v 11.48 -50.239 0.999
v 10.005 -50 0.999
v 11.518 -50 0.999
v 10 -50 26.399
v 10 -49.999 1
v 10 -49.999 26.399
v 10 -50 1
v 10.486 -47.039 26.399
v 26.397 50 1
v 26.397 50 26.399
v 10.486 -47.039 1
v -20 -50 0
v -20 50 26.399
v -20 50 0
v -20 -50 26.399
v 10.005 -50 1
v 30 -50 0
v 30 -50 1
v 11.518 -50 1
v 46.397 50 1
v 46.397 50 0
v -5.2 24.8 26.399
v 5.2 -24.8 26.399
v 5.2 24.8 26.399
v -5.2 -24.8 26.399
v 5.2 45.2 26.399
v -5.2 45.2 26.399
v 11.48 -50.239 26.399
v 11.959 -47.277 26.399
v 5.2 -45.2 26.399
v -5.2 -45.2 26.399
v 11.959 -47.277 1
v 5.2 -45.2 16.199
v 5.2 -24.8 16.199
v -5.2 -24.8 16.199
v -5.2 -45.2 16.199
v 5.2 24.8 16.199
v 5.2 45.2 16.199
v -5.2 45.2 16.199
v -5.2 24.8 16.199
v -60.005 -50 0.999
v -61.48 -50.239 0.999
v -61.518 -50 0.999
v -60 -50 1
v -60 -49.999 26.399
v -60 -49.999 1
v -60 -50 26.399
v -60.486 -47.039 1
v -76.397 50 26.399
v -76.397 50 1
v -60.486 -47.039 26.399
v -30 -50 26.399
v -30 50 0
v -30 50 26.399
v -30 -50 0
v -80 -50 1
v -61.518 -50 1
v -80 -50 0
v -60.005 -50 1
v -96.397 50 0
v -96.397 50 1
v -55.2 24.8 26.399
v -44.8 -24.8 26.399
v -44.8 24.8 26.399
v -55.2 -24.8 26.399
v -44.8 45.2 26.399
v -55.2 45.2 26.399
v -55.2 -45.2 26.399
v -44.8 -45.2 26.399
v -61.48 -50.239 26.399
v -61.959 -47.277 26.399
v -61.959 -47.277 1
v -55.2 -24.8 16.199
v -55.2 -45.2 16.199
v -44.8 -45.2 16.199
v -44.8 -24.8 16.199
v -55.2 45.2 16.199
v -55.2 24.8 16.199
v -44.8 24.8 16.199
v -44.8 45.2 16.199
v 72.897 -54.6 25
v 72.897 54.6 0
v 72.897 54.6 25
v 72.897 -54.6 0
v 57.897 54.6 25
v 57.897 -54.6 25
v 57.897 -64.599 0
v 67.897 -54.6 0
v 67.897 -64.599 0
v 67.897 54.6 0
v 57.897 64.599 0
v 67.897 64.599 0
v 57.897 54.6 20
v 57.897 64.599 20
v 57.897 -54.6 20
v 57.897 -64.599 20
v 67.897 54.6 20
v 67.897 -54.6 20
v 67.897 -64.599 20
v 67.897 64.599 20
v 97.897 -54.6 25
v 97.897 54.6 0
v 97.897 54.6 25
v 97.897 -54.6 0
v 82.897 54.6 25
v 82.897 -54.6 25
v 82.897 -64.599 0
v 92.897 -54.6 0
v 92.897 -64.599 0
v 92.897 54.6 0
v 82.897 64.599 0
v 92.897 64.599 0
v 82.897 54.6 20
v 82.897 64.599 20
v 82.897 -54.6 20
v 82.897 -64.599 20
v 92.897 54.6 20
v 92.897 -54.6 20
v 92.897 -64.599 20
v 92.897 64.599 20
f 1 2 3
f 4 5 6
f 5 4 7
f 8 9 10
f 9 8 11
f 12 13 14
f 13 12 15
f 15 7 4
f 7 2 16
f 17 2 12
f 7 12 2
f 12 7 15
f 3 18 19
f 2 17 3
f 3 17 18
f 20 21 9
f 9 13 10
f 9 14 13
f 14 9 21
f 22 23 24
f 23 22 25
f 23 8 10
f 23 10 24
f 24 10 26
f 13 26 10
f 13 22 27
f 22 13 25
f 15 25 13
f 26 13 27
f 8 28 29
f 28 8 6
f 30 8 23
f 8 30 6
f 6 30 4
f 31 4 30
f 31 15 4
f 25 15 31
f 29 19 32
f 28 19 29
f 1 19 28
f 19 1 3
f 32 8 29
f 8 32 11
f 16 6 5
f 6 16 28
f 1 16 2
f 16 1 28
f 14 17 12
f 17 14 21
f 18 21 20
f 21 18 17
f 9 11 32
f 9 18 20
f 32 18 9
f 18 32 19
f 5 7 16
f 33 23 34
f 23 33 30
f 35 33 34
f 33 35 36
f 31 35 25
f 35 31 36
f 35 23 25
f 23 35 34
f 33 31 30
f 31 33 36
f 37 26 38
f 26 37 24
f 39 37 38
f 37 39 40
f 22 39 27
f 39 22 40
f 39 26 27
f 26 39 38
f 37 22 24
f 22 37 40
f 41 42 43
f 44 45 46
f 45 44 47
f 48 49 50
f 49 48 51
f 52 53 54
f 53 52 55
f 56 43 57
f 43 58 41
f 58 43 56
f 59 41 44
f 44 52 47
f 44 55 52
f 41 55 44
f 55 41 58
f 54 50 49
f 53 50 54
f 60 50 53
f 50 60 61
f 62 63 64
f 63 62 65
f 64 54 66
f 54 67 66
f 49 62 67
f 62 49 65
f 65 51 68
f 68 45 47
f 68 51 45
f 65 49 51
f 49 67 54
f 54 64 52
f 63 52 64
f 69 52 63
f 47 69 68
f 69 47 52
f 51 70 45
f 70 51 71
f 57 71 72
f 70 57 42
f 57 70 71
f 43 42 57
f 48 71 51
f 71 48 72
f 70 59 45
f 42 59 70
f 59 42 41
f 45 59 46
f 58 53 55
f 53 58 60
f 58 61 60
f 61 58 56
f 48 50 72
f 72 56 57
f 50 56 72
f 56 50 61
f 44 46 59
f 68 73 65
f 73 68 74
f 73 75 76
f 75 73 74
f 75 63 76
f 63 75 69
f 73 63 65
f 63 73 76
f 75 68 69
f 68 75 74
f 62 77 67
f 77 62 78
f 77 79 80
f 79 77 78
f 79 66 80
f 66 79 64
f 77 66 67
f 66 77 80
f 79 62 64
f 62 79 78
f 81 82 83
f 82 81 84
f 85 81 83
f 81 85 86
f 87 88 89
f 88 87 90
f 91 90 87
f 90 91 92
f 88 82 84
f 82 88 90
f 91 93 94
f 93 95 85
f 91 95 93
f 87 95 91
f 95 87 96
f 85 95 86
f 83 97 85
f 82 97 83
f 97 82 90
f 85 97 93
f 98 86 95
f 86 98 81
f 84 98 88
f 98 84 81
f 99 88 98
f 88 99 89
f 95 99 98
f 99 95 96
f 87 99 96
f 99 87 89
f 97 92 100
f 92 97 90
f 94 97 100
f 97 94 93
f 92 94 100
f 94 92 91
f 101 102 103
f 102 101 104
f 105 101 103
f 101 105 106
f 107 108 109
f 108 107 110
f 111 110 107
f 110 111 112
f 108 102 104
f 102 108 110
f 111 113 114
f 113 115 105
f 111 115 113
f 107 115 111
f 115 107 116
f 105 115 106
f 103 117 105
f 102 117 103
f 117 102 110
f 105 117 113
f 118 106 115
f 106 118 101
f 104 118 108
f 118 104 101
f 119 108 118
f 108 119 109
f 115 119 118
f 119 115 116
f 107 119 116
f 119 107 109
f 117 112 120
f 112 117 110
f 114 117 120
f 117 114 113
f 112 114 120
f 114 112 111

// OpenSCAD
// ---------------------------------------------------------------------------
// Customizable stand for music gear
// v1.2.1
// ---------------------------------------------------------------------------
// Copyright (c) Yohan Lasorsa
// For personal use only, do not redistribute (please).
// ---------------------------------------------------------------------------
// LICENSE AGREEMENT:
// This software is provided 'as-is', without any express or implied warranty.
// In no event will the authors be held liable for any damages arising from
// the use of this software.
//
// 1. You can use and adapt this code, generate 3d models models from it and
//    print them, only for your own personal usage.
// 2. You're not allowed to redistribute this code or the 3d models generated
//    from it in any form.
// 3. You're not allowed to make any commercial usage or profit based on this
//    code or any form of its derivatives, including but not limited to,
//    3d models and printed models.
// ---------------------------------------------------------------------------
// Suggested print settings, tested with a Creality Ender 3 and Cura 5 with
// Eryone PLA filament:
// - 0.28mm layer height
// - 80mm/s print speed (40mm/s for walls)
// - Minimum 10% infill, cubic shape
//   * Recommended >= 20%, use gradual infill steps = 1 to reduce the amount
//     of used material
// - No supports needed
//
// For a different finish touch, you can try removing the top/bottom layers
// and use a geometric pattern like grid or triangles with a constant infill
// density of minimum 10%.
// ---------------------------------------------------------------------------
// Default paramameters fit a Digitakt/Digitone/Syntakt.
// See custom_stand.json file for other parameters sets.
// ---------------------------------------------------------------------------

/* [Device dimensions] ------------------------------------ */

// Device width in mm
device_width = 160;

// Device depth in mm
device_depth = 100;

// Device front height in mm
device_front_height = 20;

// Device back height in mm
device_back_height = 40;

/* [Target position] -------------------------------------- */

// Target device front height in mm
target_front_height = 50;

// Target device back height in mm (automatically calculated target_angle is used)
target_back_height = 100;

// Target device angle in degrees. If different from 0, target_back_height is automatically calculated to match the angle.
target_angle = 20;

/* [Support] ---------------------------------------------- */

// Side support width in mm. Make sure the width is large enough so that device's feet can rest on it.
support_width = 25;

// Adds a spacer between the two side supports to connect them
support_spacer = true;

// Spacer height in mm
support_spacer_height = 15;

// Spacer depth in mm
support_spacer_depth = 25;

// Front spacer height offset in mm. Adds space below the spacer, allowing for passing cables for example.
support_spacer_front_height_offset = 10;

// Back spacer height offset in mm. Adds space below the spacer, allowing for passing cables for example.
support_spacer_back_height_offset = 10;

// Offset the front spacer towards the inside of the support
support_spacer_front_depth_offset = 0;

// Offset the back spacer towards the inside of the support
support_spacer_back_depth_offset = 0;

/* [Front blocker] ---------------------------------------- */

// Adds a blocker in front of the device to prevent it from sliding forward
front_blocker = true;

// Front blocker height in mm. Should match the height of the device's feet.
front_blocker_height = 1.5;

// Front blocker depth in mm. Should match the front offset of the device's feet.
front_blocker_depth = 3;

/* [Connector] -------------------------------------------- */

// Depth of the connector part that will fit inside the side supports. Must be smaller than support_spacer_depth.
connector_depth = 20;

// Height of the connector part that will fit inside the side supports. Must be smaller than support_spacer_height.
connector_height = 10;

// Width of the connector part that will fit inside the side supports. Must be smaller than support_width.
connector_width = 10;

// Connector fit tolerance in mm. Increase this value if the connector doesn't fit inside the support or decrease to make it fit tighter.
connector_fit_tolerance = 0.4;

/* [Ears] ------------------------------------------------- */

// Adds ears to the side supports to prevent the device from moving sideways
support_ears = true;

// Ear height in mm. If support_ears_follow_device_angle is enabled, this is the minimum height of the ear.
support_ears_height = 20;

// Ear width in mm
support_ears_width = 1;

// Extra space between the device and the support ears in mm
support_ears_slack = 0.4;

// If true, the support ears follow the device angle, otherwise they follow the support angle.
support_ears_follow_device_angle = false;

/* [Other] ------------------------------------------------ */

// Show only the left support
only_left_support = false;

// Show only the right support
only_right_support = false;

// Show only a single spacer
only_support_single_spacer = false;

// Top flat view of the parts
flat_view = false;

// Show the final preview with all the parts connected. DO NOT PRINT THIS!
final_preview = false;

// Space between parts in mm
separation_offset = 10;

/* [Hidden] */

min_connector_margin = 2;
final_connector_width = min(connector_width, support_width - min_connector_margin);
final_connector_depth = min(connector_depth, support_spacer_depth - min_connector_margin);
final_connector_height = min(connector_height, support_spacer_height - min_connector_margin);

final_target_back_height = target_angle == 0 ?
  target_back_height :
  target_front_height + tan(target_angle) * device_depth;
final_target_angle = target_angle == 0 ?
  atan((target_back_height - target_front_height) / device_depth) :
  target_angle;

echo("Calculated target ", target_angle == 0 ?
  str("angle: ", final_target_angle) :
  str("back height: ", final_target_back_height)
);

fudge = .001;
final_support_width = support_width +
  (support_ears ? support_ears_slack : 0);
total_support_width = final_support_width +
  (support_ears ? support_ears_width - fudge : 0);

device_height_difference = device_back_height - device_front_height;
ear_front_height_offset = support_ears_follow_device_angle ?
  (device_height_difference < 0 ? -device_height_difference : 0) : 0;
ear_back_height_offset = support_ears_follow_device_angle ?
  (device_height_difference > 0 ? device_height_difference : 0) : 0;
ear_front_height = support_ears_height + ear_front_height_offset;
ear_back_height = support_ears_height + ear_back_height_offset;
support_front_height = target_front_height - device_front_height;
support_back_height = final_target_back_height - device_back_height;
support_spacer_width = device_width - final_support_width * 2;
support_x_size = max(support_front_height, support_back_height) +
  (front_blocker ? front_blocker_height : 0) +
  (support_ears ? max(ear_front_height, ear_back_height) : 0);
support_spacer_y_size = support_spacer_width + final_connector_width*2;

$fa = 10;
$fs = .4;
$vpr = [
  flat_view ? 0 : (final_preview ? 67.5 : 22.5),
  0,
  flat_view ? 0 : (final_preview ? 22.5 : 0)
];
$vpd = 700;
$vpt = [0, 0, 0];

// --------------------------------------------------------

module support () {
  points = [
    [0, 0],
    [0, device_depth],
    [support_back_height, device_depth],
    [support_front_height, 0],
  ];
  path = [
    [0, 1, 2, 3]
  ];
  ears_width_offset = support_ears ?
    support_ears_width - fudge : 0;

  translate([-support_x_size/2, -device_depth/2, ears_width_offset]) {
    difference() {
      union() {
        union() {
          linear_extrude(final_support_width) { 
            polygon(points, path);
          }
          if (front_blocker) {
            blocker();
          }
        }
        if (support_ears) {
          translate([0, 0, -ears_width_offset]) {
            ear();
          }
        }
      }
      if (support_spacer) {
        connector_holes();
      }
    }
  }
}

module ear() {
  points = [
    [0, 0],
    [0, device_depth],
    [support_back_height + support_ears_height + ear_back_height_offset, device_depth],
    [support_front_height + support_ears_height + ear_front_height_offset, 0],
  ];
  path = [
    [0, 1, 2, 3]
  ];
  color("orange")
  linear_extrude(support_ears_width) { 
    polygon(points, path);
  }
}

module blocker() {
  opposite_side = support_back_height - support_front_height;
  hypotenuse = sqrt(pow(opposite_side, 2) +  pow(device_depth, 2));
  blocker_angle = atan(opposite_side / hypotenuse);

  translate([support_front_height - fudge, fudge, 0]) {
    rotate([0, 0, -blocker_angle]) {
      color("red")
      cube([front_blocker_height, front_blocker_depth, final_support_width]);
    }
  }
}

module connector_holes() {
  connector_height_offset = support_spacer_height - final_connector_height;
  connector_width_offset = final_support_width - final_connector_width;
  connector_depth_offset_front = support_spacer_depth - final_connector_depth;
  connector_depth_offset_back = device_depth - support_spacer_depth;

  // Front spacer hole
  translate([
    connector_height_offset - connector_fit_tolerance/2 + support_spacer_front_height_offset,
    connector_depth_offset_front + support_spacer_front_depth_offset - connector_fit_tolerance/2,
    connector_width_offset - connector_fit_tolerance/2
  ]) {
    color("lightblue")
    cube([
      final_connector_height + connector_fit_tolerance,
      final_connector_depth + connector_fit_tolerance,
      final_connector_width + connector_fit_tolerance
    ]);
  }
  // Back spacer hole
  translate([
    connector_height_offset - connector_fit_tolerance/2 + support_spacer_back_height_offset,
    connector_depth_offset_back - support_spacer_back_depth_offset - connector_fit_tolerance/2,
    connector_width_offset - connector_fit_tolerance/2
  ]) {
    color("lightblue")
    cube([
      final_connector_height + connector_fit_tolerance,
      final_connector_depth + connector_fit_tolerance,
      final_connector_width + connector_fit_tolerance
    ]);
  }
}

module spacer() {
  translate([0, -support_spacer_y_size/2, 0]) {
    translate([-support_spacer_height/2, final_connector_width, 0]) {
      union() {
        cube([support_spacer_height, support_spacer_width, support_spacer_depth]);
        translate([0, -final_connector_width + fudge, 0]) {
          color("lightblue")
          cube([final_connector_height, final_connector_width, final_connector_depth]);
        }
        translate([0, support_spacer_width - fudge, 0]) {
          color("lightblue")
          cube([final_connector_height, final_connector_width, final_connector_depth]);
        } 
      }
    }
  }
}

if (only_right_support) {
  support();
} else if (only_left_support) {
  scale([-1, 1, 1]) {
    support();
  }
} else if (only_support_single_spacer) {
  spacer();
} else if (final_preview) {
  translate([0, 0, -support_x_size/2]) {
    // Right support
    translate([total_support_width + support_spacer_width/2, 0, support_x_size/2]) {
      rotate([0, -90, 0]) {
        support();
      }
    }

    // Left support
    translate([-total_support_width - support_spacer_width/2, 0, support_x_size/2]) {
      rotate([0, 90, 0]) {
        scale([-1, 1, 1]) {
          support();
        }
      }
    }

    if (support_spacer) {
      // Back spacer
      translate([
        0,
        device_depth/2 - support_spacer_back_depth_offset - support_spacer_depth,
        support_spacer_height/2 + support_spacer_back_height_offset
      ]) {
        rotate([0, 90, 90]) {
          spacer();
        }
      }

      // Front spacer
      translate([
        0,
        -device_depth/2 + support_spacer_front_depth_offset + support_spacer_depth,
        support_spacer_height/2 + support_spacer_front_height_offset
      ]) {
        rotate([0, -90, 90]) {
          scale([-1, 1, 1]) {
            spacer();
          }
        }
      }
    }
  }
} else {
  translate([support_spacer ? -support_spacer_height - separation_offset : 0, 0, 0]) {
    // Right support
    translate([(separation_offset + support_x_size)/2, 0, 0]) {
      support();
    }

    // Left support
    translate([-(separation_offset + support_x_size)/2, 0, 0]) {
      scale([-1, 1, 1]) {
        support();
      }
    }

    // Spacers
    if (support_spacer) {
      translate([support_x_size + separation_offset*1.5 + support_spacer_height/2, 0, 0]) {
        spacer();
      }
      translate([support_x_size + support_spacer_height + separation_offset*2.5 + support_spacer_height/2, 0, 0]) {
        spacer();
      }
    }
  }
}
